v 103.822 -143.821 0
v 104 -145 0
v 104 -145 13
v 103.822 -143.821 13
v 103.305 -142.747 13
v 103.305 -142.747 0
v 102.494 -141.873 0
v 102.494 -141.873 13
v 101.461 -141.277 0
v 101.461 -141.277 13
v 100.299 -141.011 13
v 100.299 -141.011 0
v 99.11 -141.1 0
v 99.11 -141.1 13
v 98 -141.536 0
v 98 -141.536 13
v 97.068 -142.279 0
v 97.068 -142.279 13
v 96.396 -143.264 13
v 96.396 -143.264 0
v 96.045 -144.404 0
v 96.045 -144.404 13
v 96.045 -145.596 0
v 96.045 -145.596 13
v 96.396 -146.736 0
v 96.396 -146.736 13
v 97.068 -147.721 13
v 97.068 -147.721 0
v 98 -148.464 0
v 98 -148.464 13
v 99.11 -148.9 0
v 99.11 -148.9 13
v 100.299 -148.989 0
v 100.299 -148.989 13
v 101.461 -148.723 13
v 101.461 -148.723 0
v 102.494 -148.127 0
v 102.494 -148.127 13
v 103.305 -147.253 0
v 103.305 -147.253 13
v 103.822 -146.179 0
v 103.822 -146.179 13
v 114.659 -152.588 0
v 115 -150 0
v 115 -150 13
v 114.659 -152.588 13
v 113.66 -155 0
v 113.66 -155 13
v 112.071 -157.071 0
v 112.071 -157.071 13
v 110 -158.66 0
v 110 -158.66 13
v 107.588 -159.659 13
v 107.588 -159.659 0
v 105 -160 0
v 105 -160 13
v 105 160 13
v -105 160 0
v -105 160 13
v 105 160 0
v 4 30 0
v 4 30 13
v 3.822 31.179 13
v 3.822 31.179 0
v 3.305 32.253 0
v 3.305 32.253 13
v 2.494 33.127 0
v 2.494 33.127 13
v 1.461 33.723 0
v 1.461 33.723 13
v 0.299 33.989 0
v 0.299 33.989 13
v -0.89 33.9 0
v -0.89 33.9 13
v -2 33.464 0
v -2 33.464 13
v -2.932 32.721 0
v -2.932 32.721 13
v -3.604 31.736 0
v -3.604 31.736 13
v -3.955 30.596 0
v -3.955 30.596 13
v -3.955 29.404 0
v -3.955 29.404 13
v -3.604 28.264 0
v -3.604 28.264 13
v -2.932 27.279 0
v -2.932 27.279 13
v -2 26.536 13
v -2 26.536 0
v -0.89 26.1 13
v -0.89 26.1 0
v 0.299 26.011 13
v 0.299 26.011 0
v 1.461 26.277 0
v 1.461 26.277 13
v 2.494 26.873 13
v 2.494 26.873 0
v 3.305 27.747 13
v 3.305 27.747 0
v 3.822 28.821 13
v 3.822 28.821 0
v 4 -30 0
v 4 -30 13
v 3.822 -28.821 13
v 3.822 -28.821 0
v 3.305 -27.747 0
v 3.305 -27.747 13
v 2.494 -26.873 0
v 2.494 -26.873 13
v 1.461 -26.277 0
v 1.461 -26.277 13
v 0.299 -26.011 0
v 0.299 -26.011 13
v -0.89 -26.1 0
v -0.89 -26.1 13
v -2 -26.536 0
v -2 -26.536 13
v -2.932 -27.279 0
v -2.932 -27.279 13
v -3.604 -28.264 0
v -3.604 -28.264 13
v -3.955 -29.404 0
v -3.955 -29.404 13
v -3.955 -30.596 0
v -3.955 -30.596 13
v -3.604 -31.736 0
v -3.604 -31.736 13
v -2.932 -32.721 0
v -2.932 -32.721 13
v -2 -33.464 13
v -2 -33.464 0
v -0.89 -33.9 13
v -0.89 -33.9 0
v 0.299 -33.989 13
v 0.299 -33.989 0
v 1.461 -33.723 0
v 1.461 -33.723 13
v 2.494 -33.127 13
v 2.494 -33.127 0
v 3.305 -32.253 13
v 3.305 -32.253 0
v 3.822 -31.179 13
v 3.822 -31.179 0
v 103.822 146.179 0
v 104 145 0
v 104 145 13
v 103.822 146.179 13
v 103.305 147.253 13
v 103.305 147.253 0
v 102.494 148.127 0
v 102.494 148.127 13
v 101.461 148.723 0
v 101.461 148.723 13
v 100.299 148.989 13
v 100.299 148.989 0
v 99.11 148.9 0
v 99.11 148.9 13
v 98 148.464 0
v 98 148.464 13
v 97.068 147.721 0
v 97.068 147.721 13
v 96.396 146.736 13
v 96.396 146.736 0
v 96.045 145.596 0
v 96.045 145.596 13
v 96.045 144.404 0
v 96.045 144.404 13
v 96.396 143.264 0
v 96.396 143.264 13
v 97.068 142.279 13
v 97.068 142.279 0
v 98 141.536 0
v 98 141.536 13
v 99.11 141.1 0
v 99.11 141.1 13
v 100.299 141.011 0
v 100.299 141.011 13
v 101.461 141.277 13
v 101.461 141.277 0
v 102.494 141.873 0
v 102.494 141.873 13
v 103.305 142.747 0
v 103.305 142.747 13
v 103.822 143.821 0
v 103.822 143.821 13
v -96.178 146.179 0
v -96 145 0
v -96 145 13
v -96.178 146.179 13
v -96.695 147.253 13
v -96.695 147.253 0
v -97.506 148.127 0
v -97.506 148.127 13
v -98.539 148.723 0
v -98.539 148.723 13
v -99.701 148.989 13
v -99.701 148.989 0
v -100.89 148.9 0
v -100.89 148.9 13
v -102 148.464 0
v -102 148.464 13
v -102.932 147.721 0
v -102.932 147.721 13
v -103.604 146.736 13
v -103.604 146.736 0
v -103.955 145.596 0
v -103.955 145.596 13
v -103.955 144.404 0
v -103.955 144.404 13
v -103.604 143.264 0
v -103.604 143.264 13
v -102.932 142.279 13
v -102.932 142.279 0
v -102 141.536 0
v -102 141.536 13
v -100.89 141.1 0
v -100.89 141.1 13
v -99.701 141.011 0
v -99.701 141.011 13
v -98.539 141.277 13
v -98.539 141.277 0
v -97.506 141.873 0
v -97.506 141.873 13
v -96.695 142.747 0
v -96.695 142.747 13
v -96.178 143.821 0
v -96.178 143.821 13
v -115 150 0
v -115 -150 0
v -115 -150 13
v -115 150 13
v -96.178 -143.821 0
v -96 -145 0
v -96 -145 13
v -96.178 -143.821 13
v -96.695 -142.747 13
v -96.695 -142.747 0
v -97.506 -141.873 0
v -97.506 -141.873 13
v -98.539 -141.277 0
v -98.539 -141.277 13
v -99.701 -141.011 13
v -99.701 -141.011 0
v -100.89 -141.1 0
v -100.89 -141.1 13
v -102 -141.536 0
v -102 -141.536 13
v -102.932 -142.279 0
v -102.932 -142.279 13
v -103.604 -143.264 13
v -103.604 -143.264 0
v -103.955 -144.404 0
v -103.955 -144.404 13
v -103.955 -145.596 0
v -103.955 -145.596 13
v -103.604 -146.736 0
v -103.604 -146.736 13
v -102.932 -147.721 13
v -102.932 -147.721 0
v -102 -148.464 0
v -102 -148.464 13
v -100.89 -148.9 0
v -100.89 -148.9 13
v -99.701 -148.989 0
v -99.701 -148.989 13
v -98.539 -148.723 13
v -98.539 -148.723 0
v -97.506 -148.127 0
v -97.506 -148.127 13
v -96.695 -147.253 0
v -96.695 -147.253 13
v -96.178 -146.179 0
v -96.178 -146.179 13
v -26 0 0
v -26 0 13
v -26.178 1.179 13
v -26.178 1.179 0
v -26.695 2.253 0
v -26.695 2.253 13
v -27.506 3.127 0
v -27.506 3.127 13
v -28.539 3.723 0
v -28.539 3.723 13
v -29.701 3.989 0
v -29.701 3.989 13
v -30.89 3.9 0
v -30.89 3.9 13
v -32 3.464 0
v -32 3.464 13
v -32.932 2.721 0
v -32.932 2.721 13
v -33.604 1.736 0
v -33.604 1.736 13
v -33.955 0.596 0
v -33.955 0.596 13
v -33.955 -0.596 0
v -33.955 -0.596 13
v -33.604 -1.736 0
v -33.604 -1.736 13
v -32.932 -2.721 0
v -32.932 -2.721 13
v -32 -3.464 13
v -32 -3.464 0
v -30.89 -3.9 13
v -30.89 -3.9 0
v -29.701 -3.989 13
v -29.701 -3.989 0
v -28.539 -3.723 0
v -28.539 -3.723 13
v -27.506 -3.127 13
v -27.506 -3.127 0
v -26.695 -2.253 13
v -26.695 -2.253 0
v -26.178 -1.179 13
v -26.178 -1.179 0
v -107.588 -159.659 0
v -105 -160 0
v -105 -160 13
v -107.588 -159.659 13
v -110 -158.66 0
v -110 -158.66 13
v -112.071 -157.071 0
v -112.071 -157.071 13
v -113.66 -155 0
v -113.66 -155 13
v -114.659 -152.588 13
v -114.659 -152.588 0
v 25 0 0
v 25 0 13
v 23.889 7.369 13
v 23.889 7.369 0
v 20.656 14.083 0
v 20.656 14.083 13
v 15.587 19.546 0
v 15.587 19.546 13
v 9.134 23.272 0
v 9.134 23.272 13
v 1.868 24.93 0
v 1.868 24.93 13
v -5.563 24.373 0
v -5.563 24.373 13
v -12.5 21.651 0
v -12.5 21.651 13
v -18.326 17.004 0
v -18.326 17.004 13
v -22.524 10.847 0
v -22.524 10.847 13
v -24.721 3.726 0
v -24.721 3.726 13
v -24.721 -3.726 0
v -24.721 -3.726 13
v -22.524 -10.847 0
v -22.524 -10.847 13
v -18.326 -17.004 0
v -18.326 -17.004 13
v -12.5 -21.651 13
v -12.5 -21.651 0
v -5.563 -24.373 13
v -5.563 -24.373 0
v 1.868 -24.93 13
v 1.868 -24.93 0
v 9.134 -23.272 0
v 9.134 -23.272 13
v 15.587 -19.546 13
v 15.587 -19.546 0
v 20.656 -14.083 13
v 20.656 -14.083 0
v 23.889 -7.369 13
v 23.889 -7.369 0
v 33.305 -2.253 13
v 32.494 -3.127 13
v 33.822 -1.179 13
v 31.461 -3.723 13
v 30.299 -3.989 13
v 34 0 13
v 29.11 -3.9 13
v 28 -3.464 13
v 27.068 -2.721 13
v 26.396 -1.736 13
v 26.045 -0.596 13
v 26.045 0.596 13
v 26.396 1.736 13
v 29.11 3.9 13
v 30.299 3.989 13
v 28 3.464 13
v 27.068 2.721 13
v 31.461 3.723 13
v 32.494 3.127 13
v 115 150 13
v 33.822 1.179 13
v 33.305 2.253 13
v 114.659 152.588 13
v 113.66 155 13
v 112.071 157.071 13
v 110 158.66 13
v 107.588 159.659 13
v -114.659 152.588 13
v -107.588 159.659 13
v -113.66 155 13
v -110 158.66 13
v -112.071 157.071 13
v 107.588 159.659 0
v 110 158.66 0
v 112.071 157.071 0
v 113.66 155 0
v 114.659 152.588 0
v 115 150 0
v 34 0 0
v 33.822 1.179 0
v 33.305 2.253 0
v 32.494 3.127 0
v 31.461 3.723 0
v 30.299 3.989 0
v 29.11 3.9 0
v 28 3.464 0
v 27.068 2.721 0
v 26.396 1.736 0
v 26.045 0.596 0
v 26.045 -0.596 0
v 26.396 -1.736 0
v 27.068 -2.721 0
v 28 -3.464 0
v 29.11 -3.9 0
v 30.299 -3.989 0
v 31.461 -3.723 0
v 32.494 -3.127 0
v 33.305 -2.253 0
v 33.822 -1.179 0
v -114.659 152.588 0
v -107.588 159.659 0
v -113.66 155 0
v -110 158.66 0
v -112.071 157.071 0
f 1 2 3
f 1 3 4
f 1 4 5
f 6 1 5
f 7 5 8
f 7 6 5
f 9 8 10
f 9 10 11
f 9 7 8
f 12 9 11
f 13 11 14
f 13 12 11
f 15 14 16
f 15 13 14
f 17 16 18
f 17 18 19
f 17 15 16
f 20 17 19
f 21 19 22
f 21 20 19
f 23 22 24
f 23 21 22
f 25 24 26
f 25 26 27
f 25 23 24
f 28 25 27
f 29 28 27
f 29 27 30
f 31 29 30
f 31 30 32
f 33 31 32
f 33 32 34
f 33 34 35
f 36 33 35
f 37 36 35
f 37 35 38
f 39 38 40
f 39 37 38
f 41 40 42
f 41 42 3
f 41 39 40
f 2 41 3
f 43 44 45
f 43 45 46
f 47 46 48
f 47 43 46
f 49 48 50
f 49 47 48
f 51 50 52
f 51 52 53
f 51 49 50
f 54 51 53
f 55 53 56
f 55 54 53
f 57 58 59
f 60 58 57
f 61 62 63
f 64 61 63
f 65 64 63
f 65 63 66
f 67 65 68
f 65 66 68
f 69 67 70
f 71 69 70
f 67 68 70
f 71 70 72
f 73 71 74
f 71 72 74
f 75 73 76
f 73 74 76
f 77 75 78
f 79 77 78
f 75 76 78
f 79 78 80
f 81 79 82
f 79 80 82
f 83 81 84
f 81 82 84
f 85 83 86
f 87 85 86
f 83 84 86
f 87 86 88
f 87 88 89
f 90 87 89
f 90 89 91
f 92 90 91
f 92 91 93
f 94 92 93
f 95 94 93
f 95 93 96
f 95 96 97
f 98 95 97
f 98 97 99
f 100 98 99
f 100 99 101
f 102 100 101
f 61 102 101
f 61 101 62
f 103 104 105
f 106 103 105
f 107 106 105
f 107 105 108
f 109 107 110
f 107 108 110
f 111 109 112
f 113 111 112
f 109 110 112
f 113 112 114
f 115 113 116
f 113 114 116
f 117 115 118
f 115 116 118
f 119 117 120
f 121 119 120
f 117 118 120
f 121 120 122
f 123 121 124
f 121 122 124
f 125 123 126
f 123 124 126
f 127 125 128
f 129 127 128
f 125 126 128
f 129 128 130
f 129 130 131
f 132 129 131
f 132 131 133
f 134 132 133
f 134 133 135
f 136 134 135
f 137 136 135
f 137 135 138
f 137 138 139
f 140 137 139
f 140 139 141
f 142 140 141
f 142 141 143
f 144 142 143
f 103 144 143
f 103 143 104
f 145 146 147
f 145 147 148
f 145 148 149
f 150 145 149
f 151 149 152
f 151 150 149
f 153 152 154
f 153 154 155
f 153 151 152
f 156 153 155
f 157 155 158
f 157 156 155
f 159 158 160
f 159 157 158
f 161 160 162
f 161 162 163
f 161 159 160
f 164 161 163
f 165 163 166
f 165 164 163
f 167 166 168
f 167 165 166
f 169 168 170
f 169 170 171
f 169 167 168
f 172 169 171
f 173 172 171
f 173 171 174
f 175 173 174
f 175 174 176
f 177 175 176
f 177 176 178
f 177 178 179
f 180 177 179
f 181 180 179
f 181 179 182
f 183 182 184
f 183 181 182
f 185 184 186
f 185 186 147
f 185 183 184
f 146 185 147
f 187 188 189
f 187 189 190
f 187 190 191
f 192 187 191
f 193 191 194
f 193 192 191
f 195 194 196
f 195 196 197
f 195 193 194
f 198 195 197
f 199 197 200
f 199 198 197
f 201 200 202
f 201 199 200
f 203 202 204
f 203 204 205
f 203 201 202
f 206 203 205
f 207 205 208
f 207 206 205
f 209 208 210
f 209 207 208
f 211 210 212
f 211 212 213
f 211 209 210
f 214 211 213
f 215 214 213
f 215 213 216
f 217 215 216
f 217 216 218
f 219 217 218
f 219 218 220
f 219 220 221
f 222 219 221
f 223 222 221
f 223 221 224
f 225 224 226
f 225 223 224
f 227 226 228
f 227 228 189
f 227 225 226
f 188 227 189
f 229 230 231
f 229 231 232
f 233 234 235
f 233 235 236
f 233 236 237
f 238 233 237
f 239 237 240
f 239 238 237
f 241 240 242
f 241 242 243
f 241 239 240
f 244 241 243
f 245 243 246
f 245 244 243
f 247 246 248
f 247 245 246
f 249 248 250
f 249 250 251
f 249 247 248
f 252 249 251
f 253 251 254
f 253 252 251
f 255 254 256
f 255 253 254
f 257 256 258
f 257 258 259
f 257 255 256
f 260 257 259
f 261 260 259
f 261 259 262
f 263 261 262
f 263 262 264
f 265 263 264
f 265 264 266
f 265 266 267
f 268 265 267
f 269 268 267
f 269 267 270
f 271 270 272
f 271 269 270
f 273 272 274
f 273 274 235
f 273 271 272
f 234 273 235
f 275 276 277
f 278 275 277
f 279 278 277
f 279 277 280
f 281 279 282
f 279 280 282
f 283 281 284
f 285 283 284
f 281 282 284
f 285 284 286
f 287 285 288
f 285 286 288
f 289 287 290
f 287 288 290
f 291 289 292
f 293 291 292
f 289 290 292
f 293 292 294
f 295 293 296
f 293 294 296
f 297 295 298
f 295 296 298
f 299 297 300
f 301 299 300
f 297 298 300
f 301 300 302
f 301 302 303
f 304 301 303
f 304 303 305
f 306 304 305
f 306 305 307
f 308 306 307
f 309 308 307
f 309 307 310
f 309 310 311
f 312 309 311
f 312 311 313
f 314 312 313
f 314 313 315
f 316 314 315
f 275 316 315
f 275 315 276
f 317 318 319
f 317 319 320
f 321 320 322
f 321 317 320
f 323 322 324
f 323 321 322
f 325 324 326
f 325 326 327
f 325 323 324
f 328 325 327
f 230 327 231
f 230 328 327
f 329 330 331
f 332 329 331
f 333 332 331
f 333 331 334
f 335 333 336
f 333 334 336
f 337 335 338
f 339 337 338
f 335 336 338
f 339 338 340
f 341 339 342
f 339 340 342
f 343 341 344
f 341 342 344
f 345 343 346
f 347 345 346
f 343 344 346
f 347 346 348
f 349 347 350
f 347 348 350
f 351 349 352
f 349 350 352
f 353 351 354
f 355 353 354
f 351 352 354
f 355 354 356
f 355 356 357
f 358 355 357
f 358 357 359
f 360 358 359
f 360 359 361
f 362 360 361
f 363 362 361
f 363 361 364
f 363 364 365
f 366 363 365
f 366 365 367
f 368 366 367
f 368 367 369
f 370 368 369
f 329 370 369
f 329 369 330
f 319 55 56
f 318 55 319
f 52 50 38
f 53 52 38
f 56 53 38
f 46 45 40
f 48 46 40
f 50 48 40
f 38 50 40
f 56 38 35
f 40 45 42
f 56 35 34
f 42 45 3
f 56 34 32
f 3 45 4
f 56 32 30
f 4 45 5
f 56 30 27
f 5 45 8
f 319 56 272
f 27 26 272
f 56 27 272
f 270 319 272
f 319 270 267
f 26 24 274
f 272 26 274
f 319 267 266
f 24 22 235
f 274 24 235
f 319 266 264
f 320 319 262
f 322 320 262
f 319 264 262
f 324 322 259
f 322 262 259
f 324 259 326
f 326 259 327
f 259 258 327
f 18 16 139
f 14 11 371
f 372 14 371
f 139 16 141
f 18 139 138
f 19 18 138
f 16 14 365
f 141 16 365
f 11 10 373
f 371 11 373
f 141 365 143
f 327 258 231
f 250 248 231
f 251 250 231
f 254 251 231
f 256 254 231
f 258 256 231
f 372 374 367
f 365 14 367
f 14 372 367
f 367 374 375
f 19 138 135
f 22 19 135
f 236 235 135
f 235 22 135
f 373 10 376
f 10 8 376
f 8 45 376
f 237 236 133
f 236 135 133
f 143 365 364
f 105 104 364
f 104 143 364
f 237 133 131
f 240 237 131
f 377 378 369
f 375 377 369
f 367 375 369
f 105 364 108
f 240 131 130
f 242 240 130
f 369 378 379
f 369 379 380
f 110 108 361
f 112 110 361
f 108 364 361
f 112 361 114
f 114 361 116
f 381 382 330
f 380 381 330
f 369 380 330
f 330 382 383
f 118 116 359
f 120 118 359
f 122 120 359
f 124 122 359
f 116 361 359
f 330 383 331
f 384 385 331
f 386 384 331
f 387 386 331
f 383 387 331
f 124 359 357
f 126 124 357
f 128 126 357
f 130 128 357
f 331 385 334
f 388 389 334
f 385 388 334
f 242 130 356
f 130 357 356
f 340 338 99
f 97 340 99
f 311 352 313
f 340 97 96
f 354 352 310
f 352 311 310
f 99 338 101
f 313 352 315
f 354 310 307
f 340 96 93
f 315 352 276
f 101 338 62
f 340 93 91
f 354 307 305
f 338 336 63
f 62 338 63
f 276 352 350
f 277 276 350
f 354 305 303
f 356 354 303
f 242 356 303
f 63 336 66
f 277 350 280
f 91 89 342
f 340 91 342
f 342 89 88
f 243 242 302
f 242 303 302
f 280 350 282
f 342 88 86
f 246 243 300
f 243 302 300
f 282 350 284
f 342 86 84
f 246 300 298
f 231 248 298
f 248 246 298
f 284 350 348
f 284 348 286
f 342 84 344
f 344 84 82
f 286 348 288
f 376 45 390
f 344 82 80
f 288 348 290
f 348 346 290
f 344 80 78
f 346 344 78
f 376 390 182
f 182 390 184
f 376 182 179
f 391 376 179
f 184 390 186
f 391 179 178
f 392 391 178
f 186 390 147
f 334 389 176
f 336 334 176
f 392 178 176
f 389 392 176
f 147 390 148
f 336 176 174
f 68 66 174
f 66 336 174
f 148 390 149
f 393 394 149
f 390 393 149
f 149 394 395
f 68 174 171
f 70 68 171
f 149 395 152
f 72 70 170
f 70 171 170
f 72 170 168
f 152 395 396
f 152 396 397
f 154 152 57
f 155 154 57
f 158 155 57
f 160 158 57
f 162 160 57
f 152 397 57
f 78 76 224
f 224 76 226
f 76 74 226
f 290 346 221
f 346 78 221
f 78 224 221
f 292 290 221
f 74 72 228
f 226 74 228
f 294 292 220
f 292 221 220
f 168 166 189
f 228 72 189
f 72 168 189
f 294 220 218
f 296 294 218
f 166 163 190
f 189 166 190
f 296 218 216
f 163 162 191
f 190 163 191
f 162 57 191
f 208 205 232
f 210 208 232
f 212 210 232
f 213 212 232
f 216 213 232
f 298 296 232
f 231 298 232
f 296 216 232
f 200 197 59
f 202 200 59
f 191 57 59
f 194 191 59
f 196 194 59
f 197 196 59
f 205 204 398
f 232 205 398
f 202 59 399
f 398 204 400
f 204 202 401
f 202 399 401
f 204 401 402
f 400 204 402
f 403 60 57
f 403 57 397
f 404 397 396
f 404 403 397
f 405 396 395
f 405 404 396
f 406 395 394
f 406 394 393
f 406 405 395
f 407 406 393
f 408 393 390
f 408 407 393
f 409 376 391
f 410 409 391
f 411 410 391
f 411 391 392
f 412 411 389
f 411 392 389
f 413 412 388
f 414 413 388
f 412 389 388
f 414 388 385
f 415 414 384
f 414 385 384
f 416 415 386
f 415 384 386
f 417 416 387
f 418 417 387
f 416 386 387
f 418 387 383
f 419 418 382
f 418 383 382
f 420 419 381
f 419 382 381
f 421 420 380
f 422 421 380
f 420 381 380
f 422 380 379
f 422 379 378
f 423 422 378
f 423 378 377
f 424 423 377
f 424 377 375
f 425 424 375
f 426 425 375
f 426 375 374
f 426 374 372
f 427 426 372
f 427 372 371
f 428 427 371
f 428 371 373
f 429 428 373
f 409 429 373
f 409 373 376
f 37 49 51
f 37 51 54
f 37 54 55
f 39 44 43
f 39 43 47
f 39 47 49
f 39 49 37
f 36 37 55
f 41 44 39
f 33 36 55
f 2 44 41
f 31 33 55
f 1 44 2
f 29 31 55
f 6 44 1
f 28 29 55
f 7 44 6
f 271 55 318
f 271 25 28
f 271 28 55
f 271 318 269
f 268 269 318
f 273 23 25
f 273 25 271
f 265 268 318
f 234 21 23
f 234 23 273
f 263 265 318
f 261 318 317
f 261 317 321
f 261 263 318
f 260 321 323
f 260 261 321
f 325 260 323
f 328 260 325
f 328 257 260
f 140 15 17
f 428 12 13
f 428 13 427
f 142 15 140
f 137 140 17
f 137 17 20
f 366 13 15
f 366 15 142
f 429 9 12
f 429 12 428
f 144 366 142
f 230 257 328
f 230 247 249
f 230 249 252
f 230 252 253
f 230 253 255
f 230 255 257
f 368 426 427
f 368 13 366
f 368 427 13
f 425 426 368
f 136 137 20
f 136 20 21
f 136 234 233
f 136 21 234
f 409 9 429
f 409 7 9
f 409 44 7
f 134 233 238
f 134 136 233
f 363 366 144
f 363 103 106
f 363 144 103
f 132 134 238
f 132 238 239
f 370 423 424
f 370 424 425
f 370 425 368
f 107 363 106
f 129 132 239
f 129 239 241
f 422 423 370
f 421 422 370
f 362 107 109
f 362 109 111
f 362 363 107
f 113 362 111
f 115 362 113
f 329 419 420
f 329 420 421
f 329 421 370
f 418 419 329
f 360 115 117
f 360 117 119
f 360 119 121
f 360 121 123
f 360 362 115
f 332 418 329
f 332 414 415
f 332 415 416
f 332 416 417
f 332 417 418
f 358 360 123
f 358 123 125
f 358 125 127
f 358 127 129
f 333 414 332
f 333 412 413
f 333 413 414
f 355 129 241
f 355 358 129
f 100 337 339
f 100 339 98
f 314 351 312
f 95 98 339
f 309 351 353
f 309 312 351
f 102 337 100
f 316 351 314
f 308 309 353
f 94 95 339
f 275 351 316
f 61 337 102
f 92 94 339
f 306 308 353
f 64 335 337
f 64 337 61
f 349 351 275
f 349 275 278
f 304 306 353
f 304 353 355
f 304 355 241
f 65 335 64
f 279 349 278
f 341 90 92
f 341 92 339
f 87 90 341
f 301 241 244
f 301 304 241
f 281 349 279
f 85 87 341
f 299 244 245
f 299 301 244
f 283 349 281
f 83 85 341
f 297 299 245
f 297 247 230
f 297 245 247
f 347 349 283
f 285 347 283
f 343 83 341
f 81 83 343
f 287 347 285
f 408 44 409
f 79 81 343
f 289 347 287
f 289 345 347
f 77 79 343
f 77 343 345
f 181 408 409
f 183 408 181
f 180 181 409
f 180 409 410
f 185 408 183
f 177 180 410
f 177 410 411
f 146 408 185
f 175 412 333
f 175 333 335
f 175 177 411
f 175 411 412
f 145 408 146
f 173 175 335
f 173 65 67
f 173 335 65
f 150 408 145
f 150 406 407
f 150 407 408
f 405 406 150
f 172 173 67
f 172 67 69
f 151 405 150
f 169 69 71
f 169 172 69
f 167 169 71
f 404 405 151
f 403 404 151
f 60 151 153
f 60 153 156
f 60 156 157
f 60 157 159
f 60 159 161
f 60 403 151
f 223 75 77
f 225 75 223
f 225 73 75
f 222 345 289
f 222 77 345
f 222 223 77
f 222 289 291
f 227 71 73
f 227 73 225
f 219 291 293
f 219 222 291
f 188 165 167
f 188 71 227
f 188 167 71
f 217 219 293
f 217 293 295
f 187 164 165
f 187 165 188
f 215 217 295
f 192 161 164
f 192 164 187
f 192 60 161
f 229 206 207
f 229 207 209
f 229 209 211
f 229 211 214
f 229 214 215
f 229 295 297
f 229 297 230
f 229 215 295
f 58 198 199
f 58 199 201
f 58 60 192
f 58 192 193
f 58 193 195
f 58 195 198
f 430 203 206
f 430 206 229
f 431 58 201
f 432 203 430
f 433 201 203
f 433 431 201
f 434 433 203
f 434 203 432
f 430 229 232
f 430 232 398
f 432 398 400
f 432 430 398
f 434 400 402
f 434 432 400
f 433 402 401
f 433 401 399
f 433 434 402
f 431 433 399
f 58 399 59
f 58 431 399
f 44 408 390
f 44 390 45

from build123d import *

# Parameters (mm, degrees)
CROQUIS2_R              = 4
SALIENTE_EXTRUIR1_DEPTH = 13
CROQUIS3_R              = 25
CORTAR_EXTRUIR1_DEPTH   = 14
CROQUIS3_3_R            = 4
CORTAR_EXTRUIR2_DEPTH   = 14


with BuildPart() as part:
    # Croquis2 → Saliente-Extruir1 (new body)
    with BuildSketch(Plane.XY):
        with BuildLine():
            Line((-105, 160), (105, 160))
            ThreePointArc((105, 160), (112.071067812, 157.071067812), (115, 150))
            Line((115, 150), (115, -150))
            ThreePointArc((115, -150), (112.071067812, -157.071067812), (105, -160))
            Line((105, -160), (-105, -160))
            ThreePointArc((-105, -160), (-112.071067812, -157.071067812), (-115, -150))
            Line((-115, -150), (-115, 150))
            ThreePointArc((-115, 150), (-112.071067812, 157.071067812), (-105, 160))
        make_face()
        with Locations((-100, -145)):
            Circle(CROQUIS2_R, mode=Mode.SUBTRACT)
        with Locations((-100, 145)):
            Circle(CROQUIS2_R, mode=Mode.SUBTRACT)
        with Locations((100, -145)):
            Circle(CROQUIS2_R, mode=Mode.SUBTRACT)
        with Locations((100, 145)):
            Circle(CROQUIS2_R, mode=Mode.SUBTRACT)
    extrude(amount=SALIENTE_EXTRUIR1_DEPTH)

    # Croquis3 → Cortar-Extruir1 (cut, through all)
    with BuildSketch(Plane.XY.offset(13)):
        Circle(CROQUIS3_R)
    extrude(amount=-CORTAR_EXTRUIR1_DEPTH, mode=Mode.SUBTRACT)

    # Croquis3<3> → Cortar-Extruir2 (cut, through all)
    with BuildSketch(Plane.XY.offset(13)):
        with Locations((30, 0)):
            Circle(CROQUIS3_3_R)
        with Locations((0, 30)):
            Circle(CROQUIS3_3_R)
        with Locations((-30, 0)):
            Circle(CROQUIS3_3_R)
        with Locations((0, -30)):
            Circle(CROQUIS3_3_R)
    extrude(amount=-CORTAR_EXTRUIR2_DEPTH, mode=Mode.SUBTRACT)


solid = part.part
